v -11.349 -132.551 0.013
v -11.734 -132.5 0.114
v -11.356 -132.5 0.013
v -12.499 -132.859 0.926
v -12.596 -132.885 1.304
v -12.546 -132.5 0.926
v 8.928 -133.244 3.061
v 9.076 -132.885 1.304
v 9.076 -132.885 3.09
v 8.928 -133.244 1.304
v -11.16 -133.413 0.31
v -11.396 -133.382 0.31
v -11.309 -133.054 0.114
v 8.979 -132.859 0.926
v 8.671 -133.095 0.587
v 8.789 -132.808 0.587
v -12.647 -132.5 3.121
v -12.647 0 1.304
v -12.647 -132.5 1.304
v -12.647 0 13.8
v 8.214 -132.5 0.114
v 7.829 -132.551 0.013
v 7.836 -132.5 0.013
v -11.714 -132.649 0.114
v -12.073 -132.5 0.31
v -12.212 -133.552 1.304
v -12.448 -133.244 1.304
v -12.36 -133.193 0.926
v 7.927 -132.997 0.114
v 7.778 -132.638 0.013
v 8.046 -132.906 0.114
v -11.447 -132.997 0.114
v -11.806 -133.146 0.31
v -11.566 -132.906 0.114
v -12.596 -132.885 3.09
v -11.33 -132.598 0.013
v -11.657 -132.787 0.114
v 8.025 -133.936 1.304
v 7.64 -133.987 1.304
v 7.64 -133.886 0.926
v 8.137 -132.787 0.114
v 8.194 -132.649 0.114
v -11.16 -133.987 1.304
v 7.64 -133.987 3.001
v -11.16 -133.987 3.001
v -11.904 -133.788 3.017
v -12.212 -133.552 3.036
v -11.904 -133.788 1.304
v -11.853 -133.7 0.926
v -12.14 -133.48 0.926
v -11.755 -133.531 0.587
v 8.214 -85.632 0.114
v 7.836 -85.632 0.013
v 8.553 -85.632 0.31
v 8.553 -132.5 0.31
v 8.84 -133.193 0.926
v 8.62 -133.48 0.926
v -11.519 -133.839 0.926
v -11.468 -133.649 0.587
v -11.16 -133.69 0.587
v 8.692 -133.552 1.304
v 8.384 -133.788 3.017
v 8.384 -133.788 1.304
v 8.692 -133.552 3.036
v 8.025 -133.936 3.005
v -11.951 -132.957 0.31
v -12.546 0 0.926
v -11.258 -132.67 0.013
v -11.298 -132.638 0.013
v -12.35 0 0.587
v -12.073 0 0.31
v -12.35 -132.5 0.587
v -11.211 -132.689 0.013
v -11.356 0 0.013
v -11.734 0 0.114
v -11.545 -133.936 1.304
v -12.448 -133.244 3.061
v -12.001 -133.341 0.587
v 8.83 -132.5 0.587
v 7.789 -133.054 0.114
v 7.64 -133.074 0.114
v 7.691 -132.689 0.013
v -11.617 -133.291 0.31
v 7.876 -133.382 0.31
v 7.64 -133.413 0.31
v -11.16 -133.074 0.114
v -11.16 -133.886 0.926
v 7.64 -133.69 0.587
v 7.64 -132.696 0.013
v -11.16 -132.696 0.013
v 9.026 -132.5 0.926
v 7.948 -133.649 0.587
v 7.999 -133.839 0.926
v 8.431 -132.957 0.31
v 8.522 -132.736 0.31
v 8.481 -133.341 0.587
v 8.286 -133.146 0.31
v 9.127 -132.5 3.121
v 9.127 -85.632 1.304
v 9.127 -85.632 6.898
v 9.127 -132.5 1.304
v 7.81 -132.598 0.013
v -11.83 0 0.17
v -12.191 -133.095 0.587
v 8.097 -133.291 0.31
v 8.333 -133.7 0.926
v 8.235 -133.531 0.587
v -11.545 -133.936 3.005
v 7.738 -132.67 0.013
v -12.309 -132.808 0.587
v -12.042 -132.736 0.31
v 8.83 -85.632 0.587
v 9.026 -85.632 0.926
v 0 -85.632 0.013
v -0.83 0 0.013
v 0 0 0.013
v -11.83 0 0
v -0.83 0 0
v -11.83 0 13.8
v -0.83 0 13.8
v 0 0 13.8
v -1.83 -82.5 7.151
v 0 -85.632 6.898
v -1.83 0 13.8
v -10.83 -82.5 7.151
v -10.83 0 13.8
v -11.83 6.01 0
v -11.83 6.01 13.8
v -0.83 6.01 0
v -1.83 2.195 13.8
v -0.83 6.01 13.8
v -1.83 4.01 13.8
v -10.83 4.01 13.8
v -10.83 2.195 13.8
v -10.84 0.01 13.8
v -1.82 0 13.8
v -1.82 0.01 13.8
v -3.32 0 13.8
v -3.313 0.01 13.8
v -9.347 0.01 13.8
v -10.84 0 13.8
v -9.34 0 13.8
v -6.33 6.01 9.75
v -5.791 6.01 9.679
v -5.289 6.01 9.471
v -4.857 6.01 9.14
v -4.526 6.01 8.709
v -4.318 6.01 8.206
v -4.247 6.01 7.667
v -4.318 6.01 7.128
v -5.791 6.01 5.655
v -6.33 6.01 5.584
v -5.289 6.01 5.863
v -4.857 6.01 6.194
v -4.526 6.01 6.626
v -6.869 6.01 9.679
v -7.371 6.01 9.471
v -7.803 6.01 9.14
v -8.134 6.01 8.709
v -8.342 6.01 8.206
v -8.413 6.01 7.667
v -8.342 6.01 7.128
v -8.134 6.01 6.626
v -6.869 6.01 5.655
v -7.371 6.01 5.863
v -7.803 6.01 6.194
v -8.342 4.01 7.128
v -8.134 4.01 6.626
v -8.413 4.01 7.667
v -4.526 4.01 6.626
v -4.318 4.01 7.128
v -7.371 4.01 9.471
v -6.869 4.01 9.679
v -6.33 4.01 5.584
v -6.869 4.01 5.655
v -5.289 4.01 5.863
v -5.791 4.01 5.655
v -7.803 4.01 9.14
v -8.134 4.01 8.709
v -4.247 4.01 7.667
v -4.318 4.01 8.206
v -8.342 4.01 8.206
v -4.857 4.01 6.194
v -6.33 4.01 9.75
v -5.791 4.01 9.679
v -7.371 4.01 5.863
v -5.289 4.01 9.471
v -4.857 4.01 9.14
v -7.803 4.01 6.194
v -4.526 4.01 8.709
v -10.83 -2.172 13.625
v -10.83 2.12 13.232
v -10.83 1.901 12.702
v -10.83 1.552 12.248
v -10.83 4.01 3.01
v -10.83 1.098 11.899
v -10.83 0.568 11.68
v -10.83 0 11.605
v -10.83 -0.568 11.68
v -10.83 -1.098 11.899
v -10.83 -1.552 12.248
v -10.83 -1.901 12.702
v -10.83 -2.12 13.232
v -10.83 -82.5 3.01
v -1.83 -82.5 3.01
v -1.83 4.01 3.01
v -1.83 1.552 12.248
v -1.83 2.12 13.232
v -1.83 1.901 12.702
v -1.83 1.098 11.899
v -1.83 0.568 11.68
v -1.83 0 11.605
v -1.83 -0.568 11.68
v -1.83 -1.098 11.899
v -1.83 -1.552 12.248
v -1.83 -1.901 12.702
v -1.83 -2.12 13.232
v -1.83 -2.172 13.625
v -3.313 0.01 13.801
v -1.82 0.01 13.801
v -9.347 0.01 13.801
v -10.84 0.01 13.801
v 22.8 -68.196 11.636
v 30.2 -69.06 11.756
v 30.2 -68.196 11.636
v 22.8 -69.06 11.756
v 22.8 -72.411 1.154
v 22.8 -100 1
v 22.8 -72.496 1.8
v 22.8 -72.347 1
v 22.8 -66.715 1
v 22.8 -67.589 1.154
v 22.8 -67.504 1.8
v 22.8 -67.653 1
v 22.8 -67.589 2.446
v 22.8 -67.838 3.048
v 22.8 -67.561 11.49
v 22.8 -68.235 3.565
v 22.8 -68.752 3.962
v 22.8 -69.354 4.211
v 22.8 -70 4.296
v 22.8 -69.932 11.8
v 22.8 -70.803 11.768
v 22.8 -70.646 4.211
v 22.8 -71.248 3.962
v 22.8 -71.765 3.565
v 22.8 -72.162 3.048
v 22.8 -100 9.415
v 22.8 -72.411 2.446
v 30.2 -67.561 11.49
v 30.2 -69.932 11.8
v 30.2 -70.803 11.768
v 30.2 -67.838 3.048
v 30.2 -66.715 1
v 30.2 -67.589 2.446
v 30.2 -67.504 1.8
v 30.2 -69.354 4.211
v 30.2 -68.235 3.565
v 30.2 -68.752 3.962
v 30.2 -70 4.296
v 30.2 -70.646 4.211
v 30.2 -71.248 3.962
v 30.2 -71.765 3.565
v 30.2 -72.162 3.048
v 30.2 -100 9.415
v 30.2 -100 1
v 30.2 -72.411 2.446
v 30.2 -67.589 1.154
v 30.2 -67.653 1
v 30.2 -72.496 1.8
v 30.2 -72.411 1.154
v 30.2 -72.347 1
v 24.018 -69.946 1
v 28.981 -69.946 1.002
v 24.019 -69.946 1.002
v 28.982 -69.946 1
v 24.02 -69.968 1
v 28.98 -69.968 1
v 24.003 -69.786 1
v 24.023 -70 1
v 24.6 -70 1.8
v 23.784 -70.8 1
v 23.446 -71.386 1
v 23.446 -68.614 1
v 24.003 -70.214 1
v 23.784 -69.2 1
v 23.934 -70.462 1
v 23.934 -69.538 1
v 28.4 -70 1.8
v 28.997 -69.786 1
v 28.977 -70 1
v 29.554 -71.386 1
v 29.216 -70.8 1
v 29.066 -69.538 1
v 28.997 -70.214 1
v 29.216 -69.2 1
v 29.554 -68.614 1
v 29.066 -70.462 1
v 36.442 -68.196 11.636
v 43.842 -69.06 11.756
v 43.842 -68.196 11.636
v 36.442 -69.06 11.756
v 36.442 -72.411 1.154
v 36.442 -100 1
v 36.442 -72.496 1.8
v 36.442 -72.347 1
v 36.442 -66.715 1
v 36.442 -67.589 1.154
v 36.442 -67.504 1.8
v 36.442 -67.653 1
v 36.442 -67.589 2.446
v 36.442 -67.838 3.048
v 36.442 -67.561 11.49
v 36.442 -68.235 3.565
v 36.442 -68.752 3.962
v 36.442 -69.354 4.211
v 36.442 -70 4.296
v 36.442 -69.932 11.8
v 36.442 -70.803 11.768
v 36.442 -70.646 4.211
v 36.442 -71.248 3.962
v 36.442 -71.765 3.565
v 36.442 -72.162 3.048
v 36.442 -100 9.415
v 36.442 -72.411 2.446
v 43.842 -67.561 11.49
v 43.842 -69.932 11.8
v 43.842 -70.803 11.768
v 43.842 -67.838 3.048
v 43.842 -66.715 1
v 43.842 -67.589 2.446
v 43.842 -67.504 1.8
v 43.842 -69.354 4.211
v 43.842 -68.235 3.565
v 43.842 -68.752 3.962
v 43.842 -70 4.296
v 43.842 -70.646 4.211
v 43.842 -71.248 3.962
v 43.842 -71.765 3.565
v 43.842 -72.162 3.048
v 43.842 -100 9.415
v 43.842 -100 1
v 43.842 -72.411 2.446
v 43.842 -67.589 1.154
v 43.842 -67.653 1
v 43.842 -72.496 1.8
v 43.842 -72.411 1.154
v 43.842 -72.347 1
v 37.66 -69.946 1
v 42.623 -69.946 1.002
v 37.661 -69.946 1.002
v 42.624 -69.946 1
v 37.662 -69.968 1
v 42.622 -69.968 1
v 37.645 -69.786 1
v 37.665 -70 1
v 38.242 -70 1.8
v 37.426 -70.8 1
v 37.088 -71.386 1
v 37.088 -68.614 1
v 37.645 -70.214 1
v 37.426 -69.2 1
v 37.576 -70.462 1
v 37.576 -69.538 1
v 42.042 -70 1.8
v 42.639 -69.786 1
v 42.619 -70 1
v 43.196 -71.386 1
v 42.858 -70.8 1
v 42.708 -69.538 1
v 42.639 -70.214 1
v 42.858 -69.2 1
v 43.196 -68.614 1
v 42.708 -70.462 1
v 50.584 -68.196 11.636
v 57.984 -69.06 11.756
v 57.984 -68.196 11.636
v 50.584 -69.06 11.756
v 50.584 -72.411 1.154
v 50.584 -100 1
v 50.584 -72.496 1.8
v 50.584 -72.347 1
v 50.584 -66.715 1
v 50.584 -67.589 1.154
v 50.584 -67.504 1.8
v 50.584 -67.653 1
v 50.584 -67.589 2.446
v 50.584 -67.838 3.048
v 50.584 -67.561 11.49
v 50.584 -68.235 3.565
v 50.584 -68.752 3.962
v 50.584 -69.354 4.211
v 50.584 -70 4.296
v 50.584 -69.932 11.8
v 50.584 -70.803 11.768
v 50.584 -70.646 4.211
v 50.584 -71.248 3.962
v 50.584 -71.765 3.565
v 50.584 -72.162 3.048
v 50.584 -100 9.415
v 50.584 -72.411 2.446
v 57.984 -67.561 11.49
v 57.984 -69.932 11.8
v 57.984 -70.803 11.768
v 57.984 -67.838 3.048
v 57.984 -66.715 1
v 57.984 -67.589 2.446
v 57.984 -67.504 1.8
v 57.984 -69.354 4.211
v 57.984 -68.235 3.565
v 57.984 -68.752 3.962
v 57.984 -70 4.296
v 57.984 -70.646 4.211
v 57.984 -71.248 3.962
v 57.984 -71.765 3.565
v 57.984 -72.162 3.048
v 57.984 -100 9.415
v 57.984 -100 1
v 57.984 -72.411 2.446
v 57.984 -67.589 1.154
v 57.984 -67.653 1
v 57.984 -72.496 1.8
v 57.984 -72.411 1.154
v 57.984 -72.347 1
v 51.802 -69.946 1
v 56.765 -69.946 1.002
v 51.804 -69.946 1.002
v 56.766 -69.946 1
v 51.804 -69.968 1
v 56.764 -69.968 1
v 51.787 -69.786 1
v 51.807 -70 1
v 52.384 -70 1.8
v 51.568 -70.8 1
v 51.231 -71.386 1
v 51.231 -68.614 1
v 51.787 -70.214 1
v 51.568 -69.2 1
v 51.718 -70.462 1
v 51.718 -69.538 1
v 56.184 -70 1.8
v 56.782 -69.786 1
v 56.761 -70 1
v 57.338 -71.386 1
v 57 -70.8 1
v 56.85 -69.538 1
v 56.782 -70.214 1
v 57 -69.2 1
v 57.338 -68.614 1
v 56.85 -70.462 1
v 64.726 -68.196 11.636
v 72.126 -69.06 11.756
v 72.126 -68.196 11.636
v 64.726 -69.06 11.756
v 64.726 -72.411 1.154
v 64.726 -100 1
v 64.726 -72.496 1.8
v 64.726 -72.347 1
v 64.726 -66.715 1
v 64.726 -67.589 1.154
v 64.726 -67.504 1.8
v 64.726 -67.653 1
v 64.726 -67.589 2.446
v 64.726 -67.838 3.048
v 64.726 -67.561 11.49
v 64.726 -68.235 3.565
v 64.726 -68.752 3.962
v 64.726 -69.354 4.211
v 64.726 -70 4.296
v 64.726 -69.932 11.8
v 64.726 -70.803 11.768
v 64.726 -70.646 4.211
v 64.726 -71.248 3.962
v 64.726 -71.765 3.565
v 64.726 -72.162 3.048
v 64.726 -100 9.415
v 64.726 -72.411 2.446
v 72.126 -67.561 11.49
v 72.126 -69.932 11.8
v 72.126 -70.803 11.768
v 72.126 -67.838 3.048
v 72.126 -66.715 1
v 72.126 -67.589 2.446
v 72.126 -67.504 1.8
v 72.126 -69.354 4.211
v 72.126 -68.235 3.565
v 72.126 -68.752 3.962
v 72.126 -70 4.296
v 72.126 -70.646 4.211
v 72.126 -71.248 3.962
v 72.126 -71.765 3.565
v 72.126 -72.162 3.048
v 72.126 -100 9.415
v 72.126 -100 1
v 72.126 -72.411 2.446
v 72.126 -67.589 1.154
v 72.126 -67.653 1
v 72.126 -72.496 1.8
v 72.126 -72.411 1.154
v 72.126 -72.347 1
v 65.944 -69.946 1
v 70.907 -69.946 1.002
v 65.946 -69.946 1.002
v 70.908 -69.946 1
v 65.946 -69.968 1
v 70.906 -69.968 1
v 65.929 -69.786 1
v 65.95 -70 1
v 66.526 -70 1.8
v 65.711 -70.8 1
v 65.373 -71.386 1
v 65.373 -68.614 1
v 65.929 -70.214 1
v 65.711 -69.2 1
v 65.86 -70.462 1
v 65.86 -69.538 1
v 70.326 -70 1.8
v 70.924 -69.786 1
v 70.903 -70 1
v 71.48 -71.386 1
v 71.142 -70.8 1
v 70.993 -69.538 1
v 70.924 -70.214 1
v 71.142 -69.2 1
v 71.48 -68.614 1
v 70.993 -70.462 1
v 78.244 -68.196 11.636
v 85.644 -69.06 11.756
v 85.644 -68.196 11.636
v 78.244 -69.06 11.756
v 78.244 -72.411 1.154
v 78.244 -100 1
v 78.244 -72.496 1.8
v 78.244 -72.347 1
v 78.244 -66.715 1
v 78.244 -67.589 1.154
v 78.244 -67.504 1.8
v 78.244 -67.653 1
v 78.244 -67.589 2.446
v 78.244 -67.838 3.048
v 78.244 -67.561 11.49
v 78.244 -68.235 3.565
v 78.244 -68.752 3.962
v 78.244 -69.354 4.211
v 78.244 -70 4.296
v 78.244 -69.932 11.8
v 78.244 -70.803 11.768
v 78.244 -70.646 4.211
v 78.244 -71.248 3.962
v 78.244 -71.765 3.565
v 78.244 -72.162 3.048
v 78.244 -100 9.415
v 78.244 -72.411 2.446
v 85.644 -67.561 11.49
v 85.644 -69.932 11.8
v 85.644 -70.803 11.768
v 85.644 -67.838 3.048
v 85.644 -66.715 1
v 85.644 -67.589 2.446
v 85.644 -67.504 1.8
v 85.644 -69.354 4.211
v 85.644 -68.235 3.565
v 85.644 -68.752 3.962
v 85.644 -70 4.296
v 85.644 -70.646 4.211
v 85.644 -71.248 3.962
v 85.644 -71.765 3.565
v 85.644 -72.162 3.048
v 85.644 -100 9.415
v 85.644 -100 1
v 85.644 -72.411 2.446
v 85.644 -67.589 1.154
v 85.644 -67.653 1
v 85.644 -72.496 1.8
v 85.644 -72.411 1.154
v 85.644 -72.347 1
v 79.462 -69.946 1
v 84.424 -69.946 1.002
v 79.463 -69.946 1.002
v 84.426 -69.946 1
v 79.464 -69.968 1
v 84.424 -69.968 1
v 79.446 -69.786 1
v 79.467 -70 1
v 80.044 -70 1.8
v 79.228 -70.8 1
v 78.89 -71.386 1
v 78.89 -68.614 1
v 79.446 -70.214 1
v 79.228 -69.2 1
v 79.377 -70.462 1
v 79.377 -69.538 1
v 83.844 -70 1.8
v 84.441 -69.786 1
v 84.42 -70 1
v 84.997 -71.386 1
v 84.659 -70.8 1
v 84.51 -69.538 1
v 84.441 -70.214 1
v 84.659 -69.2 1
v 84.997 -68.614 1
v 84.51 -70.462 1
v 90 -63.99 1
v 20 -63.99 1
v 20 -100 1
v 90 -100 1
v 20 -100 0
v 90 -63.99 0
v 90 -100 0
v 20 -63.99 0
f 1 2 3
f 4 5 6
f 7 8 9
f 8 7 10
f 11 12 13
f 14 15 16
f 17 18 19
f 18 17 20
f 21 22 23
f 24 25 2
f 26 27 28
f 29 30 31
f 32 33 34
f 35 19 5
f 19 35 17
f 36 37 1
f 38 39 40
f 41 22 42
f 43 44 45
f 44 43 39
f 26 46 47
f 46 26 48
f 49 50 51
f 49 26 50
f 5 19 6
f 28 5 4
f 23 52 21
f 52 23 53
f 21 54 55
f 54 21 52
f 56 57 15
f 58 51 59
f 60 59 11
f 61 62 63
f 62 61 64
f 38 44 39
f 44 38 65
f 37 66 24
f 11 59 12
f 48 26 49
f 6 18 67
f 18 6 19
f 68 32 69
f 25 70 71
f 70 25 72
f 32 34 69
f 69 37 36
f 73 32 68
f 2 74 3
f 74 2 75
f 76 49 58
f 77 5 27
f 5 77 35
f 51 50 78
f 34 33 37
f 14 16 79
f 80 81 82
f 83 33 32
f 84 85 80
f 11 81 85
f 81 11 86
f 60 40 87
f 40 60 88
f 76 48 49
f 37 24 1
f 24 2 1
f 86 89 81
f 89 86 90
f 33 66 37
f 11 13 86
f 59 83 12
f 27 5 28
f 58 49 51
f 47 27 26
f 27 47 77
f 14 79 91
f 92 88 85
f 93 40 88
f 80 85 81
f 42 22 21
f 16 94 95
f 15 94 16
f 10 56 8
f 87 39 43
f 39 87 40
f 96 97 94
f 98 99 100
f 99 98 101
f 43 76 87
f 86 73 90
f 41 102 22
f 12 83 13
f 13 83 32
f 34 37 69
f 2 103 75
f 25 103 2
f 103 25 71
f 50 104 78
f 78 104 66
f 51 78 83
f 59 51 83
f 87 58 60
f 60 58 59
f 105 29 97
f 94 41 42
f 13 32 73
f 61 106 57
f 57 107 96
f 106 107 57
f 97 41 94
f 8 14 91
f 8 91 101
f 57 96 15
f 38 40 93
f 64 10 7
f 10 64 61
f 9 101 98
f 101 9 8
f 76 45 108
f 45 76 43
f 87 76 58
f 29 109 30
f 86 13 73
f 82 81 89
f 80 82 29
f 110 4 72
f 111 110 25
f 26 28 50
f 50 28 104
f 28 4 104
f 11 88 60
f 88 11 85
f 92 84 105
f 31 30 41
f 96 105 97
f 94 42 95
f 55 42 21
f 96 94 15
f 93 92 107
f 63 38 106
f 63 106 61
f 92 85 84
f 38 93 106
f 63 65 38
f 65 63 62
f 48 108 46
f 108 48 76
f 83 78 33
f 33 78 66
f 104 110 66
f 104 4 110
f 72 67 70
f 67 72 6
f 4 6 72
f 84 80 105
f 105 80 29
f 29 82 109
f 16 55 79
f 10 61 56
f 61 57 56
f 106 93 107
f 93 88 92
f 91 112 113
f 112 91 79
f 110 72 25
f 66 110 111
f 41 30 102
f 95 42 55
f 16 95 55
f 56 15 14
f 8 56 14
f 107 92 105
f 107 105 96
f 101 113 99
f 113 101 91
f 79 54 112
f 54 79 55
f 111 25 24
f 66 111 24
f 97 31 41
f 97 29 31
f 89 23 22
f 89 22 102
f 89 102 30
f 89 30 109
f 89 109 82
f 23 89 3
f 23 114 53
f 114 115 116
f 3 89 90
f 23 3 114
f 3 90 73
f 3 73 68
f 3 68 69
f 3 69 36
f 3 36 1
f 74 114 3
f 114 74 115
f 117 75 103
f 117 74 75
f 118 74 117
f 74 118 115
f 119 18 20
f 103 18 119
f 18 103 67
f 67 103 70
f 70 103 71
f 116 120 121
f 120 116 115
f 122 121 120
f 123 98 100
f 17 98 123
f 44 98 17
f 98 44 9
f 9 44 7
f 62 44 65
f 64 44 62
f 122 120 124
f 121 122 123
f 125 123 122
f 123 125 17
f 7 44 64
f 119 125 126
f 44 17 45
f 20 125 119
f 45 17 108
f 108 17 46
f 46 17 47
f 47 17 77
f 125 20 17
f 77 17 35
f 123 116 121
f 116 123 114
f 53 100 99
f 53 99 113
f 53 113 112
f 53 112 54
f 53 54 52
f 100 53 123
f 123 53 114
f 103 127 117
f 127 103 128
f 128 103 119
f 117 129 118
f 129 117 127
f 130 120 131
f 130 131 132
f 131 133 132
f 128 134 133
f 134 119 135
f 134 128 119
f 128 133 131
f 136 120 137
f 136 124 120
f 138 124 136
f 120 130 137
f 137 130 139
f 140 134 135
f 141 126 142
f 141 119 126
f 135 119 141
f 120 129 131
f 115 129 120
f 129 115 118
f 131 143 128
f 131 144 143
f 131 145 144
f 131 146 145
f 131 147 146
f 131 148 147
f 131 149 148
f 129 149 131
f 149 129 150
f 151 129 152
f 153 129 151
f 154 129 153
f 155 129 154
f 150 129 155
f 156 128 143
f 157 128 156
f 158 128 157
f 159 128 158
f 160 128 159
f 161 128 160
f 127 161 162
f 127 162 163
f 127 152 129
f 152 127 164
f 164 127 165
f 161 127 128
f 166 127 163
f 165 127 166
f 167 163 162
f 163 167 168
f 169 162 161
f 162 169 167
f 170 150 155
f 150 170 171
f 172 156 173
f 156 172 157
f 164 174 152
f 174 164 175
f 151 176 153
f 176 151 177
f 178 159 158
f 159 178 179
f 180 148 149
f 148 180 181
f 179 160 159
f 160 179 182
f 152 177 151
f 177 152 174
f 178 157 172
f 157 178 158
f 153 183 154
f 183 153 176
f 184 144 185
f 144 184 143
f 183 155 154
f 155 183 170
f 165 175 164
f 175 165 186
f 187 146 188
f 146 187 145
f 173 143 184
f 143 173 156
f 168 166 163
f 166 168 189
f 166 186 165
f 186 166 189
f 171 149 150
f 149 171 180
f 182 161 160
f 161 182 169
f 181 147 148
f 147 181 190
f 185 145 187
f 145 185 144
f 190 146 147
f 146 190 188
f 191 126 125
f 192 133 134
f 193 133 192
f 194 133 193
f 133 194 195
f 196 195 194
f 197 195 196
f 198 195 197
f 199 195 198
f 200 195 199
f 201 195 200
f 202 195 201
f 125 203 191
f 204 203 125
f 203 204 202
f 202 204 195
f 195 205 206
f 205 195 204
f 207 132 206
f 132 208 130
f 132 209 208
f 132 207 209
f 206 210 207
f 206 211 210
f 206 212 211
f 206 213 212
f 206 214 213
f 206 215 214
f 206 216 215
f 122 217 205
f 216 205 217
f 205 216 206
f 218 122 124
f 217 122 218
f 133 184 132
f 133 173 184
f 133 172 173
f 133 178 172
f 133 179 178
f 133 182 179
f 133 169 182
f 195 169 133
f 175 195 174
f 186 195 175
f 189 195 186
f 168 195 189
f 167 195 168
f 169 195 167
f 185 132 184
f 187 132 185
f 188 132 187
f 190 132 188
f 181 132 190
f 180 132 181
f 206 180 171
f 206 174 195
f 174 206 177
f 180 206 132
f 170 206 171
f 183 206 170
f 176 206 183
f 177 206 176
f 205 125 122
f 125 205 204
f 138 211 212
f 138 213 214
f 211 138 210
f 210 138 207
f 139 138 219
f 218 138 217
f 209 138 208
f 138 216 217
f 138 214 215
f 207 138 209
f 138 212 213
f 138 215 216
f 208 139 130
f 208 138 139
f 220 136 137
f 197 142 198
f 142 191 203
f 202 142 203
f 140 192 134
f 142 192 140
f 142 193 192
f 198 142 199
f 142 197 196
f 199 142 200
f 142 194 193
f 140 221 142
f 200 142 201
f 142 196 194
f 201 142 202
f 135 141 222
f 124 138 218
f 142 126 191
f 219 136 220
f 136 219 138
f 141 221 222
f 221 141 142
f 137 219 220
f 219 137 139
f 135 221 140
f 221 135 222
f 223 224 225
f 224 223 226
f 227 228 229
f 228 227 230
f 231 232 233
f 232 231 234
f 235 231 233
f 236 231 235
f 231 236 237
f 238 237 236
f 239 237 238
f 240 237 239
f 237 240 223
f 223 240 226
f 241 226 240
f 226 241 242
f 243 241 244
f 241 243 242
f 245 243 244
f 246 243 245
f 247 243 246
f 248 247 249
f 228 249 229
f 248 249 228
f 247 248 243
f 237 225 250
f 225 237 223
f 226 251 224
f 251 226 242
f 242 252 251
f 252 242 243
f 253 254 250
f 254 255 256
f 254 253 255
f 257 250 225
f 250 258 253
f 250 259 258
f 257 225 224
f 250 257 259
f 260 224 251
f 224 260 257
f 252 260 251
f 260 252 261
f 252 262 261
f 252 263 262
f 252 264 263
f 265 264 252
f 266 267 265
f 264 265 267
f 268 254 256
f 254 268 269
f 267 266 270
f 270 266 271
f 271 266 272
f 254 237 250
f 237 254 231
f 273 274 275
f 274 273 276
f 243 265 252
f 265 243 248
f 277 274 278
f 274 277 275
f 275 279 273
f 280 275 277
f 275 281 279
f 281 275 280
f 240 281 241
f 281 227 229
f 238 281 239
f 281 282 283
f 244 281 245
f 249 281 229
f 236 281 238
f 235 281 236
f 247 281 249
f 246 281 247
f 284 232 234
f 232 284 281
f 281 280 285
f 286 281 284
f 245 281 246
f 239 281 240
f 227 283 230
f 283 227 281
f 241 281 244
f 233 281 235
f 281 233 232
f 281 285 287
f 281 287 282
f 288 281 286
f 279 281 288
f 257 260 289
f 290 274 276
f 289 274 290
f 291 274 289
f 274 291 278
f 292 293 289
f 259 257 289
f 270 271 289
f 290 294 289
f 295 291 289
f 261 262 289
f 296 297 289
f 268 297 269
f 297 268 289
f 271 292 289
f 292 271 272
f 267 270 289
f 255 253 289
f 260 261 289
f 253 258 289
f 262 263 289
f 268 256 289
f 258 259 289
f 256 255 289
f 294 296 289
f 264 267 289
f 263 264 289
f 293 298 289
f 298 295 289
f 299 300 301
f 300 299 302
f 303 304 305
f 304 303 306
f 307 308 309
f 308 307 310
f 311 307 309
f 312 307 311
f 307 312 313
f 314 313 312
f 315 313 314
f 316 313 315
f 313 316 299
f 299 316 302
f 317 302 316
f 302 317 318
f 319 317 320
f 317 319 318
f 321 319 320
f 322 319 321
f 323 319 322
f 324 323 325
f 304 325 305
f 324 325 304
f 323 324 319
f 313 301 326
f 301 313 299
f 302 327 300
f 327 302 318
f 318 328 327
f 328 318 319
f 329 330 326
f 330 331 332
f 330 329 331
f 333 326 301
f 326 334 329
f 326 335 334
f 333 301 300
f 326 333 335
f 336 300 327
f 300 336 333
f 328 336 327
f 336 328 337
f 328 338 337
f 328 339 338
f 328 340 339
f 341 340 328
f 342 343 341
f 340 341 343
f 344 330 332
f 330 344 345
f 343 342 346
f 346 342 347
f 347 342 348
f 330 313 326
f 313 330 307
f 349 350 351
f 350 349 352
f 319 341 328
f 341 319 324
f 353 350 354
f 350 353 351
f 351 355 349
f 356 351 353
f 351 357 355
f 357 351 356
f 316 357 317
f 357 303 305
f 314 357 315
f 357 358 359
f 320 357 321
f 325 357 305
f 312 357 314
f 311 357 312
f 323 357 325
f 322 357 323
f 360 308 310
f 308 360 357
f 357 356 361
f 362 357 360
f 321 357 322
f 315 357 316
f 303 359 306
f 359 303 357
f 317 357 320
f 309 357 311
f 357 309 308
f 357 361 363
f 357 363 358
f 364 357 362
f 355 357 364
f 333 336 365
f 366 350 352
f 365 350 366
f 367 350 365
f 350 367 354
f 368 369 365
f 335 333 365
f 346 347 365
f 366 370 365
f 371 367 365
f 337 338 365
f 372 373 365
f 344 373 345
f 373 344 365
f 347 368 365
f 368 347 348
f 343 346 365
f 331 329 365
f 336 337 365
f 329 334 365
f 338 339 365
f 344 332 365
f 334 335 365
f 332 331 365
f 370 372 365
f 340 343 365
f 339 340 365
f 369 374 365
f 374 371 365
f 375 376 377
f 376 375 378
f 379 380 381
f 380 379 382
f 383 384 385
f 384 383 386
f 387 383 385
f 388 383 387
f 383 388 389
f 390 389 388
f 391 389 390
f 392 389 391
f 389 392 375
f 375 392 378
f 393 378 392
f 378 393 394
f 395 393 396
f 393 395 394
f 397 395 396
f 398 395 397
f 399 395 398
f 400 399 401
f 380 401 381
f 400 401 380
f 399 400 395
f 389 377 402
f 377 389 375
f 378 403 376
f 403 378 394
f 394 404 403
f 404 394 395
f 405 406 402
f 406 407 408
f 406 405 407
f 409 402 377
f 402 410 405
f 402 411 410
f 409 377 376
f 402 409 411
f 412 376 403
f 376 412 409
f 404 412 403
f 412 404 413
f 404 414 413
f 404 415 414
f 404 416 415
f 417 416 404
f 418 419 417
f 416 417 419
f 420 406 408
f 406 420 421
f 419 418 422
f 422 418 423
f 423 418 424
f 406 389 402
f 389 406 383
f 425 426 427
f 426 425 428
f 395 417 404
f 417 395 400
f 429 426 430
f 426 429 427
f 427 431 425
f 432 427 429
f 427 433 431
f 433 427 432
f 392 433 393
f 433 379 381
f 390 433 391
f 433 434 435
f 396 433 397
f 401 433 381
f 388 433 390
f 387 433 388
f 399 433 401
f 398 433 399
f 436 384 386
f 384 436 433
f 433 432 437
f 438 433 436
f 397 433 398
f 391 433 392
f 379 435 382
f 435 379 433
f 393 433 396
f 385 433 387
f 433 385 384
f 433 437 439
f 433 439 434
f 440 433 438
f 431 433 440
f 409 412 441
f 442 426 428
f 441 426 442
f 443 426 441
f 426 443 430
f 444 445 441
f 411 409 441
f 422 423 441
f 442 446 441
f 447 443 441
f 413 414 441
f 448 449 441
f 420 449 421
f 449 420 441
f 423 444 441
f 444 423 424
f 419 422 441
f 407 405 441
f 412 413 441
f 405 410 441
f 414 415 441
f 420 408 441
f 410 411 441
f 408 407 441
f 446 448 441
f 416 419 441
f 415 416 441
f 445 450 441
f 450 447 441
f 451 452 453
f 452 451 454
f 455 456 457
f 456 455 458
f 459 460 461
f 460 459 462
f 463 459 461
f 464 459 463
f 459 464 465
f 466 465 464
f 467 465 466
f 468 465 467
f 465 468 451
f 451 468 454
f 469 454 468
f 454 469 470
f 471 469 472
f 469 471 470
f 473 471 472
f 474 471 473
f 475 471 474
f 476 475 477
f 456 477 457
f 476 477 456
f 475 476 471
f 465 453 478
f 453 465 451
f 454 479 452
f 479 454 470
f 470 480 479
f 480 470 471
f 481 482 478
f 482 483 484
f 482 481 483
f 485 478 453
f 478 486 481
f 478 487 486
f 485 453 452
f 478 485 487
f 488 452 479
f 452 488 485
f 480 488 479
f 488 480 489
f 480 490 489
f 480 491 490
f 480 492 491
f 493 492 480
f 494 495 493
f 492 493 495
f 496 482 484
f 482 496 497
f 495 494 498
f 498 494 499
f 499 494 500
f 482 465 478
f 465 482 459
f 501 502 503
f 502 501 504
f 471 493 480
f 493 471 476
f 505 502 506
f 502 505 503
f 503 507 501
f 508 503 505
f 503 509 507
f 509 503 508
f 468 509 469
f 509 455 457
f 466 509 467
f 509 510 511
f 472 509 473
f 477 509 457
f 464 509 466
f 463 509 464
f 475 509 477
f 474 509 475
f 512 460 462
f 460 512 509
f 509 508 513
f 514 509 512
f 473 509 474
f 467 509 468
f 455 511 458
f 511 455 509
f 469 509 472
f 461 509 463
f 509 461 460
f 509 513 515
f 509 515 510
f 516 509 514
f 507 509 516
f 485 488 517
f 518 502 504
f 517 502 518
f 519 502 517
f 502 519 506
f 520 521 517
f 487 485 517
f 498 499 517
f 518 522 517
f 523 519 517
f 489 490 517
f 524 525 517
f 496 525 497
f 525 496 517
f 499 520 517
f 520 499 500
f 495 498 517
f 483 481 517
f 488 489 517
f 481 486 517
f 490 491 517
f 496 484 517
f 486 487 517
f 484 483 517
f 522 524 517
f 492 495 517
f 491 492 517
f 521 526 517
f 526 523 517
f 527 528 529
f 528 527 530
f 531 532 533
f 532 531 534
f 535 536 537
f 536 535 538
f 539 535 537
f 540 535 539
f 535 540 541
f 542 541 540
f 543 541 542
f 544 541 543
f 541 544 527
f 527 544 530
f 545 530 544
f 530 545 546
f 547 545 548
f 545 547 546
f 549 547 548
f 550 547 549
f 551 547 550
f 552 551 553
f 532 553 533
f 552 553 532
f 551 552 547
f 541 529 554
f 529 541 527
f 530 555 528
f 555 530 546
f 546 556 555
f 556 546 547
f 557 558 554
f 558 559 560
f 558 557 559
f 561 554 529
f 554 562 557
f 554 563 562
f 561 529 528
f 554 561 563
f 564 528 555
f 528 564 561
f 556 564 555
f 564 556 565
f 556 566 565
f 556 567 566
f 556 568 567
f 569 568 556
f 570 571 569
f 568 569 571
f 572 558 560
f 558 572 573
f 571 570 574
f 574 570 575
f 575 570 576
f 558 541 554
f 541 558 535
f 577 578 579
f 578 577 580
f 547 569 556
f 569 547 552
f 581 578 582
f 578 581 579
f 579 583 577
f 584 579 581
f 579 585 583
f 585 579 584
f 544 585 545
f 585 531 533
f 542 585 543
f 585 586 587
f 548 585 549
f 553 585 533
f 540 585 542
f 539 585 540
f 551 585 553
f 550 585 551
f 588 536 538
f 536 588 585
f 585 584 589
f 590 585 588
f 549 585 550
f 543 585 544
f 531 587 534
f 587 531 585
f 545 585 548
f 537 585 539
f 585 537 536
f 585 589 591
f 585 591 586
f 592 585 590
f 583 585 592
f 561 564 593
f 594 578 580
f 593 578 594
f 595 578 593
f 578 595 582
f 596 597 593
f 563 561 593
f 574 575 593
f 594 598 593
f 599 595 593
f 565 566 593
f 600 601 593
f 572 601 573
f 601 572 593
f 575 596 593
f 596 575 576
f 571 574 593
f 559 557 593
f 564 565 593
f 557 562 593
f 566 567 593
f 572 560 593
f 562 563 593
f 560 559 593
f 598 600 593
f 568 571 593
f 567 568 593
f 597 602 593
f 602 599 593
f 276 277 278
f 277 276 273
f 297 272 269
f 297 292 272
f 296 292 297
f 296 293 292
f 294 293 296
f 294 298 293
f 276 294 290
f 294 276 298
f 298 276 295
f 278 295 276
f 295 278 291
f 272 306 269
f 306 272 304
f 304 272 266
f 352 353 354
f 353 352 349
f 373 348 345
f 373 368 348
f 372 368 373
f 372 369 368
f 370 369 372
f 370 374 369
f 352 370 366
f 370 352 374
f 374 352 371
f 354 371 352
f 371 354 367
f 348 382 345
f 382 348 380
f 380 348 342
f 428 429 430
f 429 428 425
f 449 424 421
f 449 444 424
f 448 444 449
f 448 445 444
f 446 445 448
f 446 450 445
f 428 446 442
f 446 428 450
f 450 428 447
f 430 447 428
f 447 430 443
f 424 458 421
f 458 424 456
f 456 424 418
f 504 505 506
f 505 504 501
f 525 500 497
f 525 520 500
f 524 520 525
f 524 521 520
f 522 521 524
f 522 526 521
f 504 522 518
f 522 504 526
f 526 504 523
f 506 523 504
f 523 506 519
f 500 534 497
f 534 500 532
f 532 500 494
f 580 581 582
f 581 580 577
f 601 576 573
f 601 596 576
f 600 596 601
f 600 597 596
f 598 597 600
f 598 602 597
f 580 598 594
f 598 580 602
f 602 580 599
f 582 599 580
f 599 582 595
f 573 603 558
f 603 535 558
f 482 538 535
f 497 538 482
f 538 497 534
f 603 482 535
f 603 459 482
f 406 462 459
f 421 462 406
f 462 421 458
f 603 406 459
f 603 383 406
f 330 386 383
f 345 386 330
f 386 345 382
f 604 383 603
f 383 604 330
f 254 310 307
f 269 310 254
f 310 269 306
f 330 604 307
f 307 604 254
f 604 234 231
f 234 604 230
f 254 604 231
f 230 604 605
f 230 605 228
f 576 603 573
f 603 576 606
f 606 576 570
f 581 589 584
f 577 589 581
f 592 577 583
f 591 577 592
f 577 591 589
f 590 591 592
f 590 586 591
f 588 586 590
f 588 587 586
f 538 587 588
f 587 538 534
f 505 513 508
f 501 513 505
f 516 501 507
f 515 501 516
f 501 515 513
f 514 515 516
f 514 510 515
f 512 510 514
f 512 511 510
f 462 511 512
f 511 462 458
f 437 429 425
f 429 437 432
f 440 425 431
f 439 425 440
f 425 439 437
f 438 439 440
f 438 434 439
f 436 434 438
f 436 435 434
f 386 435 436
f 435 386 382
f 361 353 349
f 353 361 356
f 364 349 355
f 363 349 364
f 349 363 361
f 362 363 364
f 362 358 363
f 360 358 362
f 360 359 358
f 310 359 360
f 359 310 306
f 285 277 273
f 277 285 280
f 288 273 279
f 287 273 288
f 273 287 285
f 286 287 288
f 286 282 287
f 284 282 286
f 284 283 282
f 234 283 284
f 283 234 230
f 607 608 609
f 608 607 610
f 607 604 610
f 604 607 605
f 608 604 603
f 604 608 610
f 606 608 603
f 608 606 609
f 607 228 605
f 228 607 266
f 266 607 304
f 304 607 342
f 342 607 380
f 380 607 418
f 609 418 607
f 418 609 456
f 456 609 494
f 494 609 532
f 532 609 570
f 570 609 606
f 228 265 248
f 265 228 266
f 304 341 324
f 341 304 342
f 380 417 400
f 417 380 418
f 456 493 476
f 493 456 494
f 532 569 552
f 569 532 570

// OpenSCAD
/* piano-keyboard.scad - piano keyboard with dimensions copied from my midi keyboard
 * William de Beaumont
 * 2017-02-19
 */

// measurements taken from my optimus md-1150
octave = 162.5;
white_width = 21.8;
white_gap = octave / 7 - white_width; // suspiciously close to sqrt(2)
black_width = 11; // but slightly narrower at the top
black_top_width = 9.8; // ?
white_depth = 134;
black_min_depth = 77; // at top
black_max_depth = 84; // at bottom, next to top of white key
white_travel = 16.9 - 6.1; // at max end of white key
// measured
//black_travel = 12 - 5.6; // ? at max end of black key (but tilted)
// calculated with the assumption that the travel angle is the same for b&w
black_travel = white_travel * black_max_depth / white_depth;
// height of black key above white key, with neither depressed
black_min_height = 8; // at min end of key, toward fulcrum
black_max_height = 12; // at max end of key
corner_radius = 1.5; // ? approx (maybe less for top of black keys)
// ^^^ doesn't apply to cutouts in white keys for black keys

// measurements from paper transfer
c_stem_width = 13;
d_stem_width = 14;
e_stem_width = 12.75;
f_stem_width = 12.1;
g_stem_width = 12.15;
a_stem_width = 12.15;
b_stem_width = 12.1;

black_gap =
  (octave - 
    ( // add up everything but the black gaps
      c_stem_width +
      d_stem_width +
      e_stem_width +
      f_stem_width +
      g_stem_width +
      a_stem_width +
      b_stem_width +
      5*black_width +
      2*white_gap
    )
  ) / 10;

c_x = 0;
c_sharp_x = c_x + c_stem_width + black_gap;
d_x = c_sharp_x + black_width + black_gap;
d_sharp_x = d_x + d_stem_width + black_gap;
e_x = d_sharp_x + black_width + black_gap;
f_x = e_x + e_stem_width + white_gap;
f_sharp_x = f_x + f_stem_width + black_gap;
g_x = f_sharp_x + black_width + black_gap;
g_sharp_x = g_x + g_stem_width + black_gap;
a_x = g_sharp_x + black_width + black_gap;
a_sharp_x = a_x + a_stem_width + black_gap;
b_x = a_sharp_x + black_width + black_gap;

screw_radius = 4.1656 / 2; // UTS #8

// end measurements

wall_thickness = 1;
white_thickness = 2*corner_radius;
gap = 0.3;
thin_wall_deduction = 0.2;/* for imperfect printing */
sliding_deduction = 0.3;
support_gap = gap + thin_wall_deduction + sliding_deduction; // TODO more gap for easy sliding?
epsilon = 0.01;

pad_thickness = 25.4 / 4; // 1/4"
screw_axis_height = pad_thickness + screw_radius - (wall_thickness + support_gap) - 0.5/*for imperfect printing*/;
screw_hole_depth = 2*wall_thickness;

key_back_width = black_width;
key_back_depth = 6+epsilon;
white_back_height = white_travel + white_thickness;
black_back_height = white_back_height + black_min_height;

hollow_width = key_back_width - 2*wall_thickness;
hollow_height = white_travel;
support_width = hollow_width - 2*support_gap;
support_depth = 40;

hinge_radius = key_back_depth - (screw_hole_depth+wall_thickness+support_gap);
hinge_height = wall_thickness + 0.5/*for imperfect printing*/;

$fn=24;

module white_key(left_cutout, right_cutout) {
    translate([-left_cutout,0,0])
  union() {
    difference() {
      union() {
	// front
	difference() {
	  intersection() {
	    minkowski() {
		translate([corner_radius,-(white_depth-corner_radius),0])
	      cube([white_width-2*corner_radius, white_depth-corner_radius, white_travel + white_thickness -corner_radius]);
	      sphere(r=corner_radius);
	    }
	      translate([-epsilon,-(white_depth+epsilon),0])
	    cube([white_width+2*epsilon, white_depth+epsilon, white_travel + white_thickness +epsilon]);
	    // the "10" in the following I think should be:
	    // white_thickness*white_travel/sqrt(white_depth*white_depth+white_travel*white_travel)
	    // but obviously I made a mistake because that still cuts into the front
	      rotate([-atan2(white_travel, white_depth),0,0])
	      translate([0,-white_depth-10,0])
	    cube([white_width+2*epsilon, white_depth + 10, white_travel + white_thickness]);
	  }
	  if (left_cutout > 0) {
	      translate([-epsilon, epsilon-(black_max_depth + black_gap), -epsilon])
	    cube([left_cutout + epsilon, black_max_depth + black_gap, white_travel + white_thickness + 2*epsilon]);
	  }
	  if (right_cutout > 0) {
	      translate([white_width - right_cutout, epsilon-(black_max_depth + black_gap), -epsilon])
	    cube([right_cutout + epsilon, black_max_depth + black_gap, white_travel + white_thickness + 2*epsilon]);
	  }
	}
	// back
	  translate([left_cutout + (white_width - left_cutout - right_cutout - key_back_width) / 2, 0, 0])
	difference() {
	  cube([key_back_width, key_back_depth, white_back_height]);
	    translate([key_back_width/2, key_back_depth+epsilon, screw_axis_height])
	    rotate([90,0,0])
	  cylinder(r=screw_radius, h=screw_hole_depth+2*epsilon);
	}
      }
      // hollow
	translate([left_cutout + (white_width - left_cutout - right_cutout - hollow_width)/2,-(black_max_depth-corner_radius),-epsilon])
      cube([hollow_width, black_max_depth+key_back_depth-(corner_radius + screw_hole_depth), hollow_height]);
    }
    // hinge
      translate([left_cutout + (white_width - left_cutout - right_cutout - hollow_width)/2,0,0])
    intersection() {
      union() {
	  translate([-epsilon,0,0])
	  rotate([0,90,0])
	cylinder(r1=hinge_radius, r2=0, h=hinge_height);
	  translate([hollow_width+epsilon,0,0])
	  rotate([0,-90,0])
	cylinder(r1=hinge_radius, r2=0, h=hinge_height);
      }
      union() {
	  translate([-2*epsilon,0,0])
	cube([hollow_width+4*epsilon, hinge_radius+epsilon, hinge_radius+epsilon]);
	  rotate([-atan2(white_travel, white_depth),0,0])
	  translate([-2*epsilon,-hinge_radius,0])
	cube([hollow_width+4*epsilon, hinge_radius+epsilon, hinge_radius+epsilon]);
      }
    }
  }
}

module black_key() {
  /* no-radius version
    translate([0,0,white_travel + white_thickness])
  polyhedron(
    points=[
      // at top of white keys
      [		 0,			0, 0],
      [black_width,			0, 0],
      [		 0,	-black_max_depth,  0],
      [black_width,	-black_max_depth,  0],
      // at top of black key
      [(black_width - black_top_width)/2,
       0,
       black_min_height],
      [black_width - (black_width - black_top_width)/2,
       0,
       black_min_height],
      [(black_width - black_top_width)/2,
       -black_min_depth,
       black_max_height],
      [black_width - (black_width - black_top_width)/2,
       -black_min_depth,
       black_max_height]
    ],
    faces=[
      [0,2,3,1], // bottom
      [4,5,7,6], // top
      [0,4,6,2], // left
      [1,3,7,5], // right
      [0,1,5,4], // back
      [2,6,7,3], // front
    ],
    convexity=2
  );*/
  // radius version
  difference() {
    union() {
      // bottom (under top of white keys)
	translate([0, -(black_max_depth-corner_radius), 0])
      cube([black_width, black_max_depth-corner_radius, white_travel + white_thickness]);
	translate([corner_radius, -black_max_depth, 0])
      cube([black_width - 2*corner_radius, corner_radius, white_travel + white_thickness]);
	translate([corner_radius, -(black_max_depth-corner_radius), 0])
      cylinder(r=corner_radius, h=white_travel + white_thickness);
	translate([black_width - corner_radius, -(black_max_depth-corner_radius), 0])
      cylinder(r=corner_radius, h=white_travel + white_thickness);
      // back
      cube([key_back_width, key_back_depth, black_back_height]);
      // top (over top of white keys)
      minkowski() {
	  translate([0,0,white_travel + white_thickness])
	polyhedron(
	  points=[
	    // at top of white keys
	    [corner_radius,				0,		0],
	    [black_width-corner_radius,			0,		0],
	    [corner_radius,	-black_max_depth+corner_radius,		0],
	    [black_width-corner_radius,-black_max_depth+corner_radius,	0],
	    // at top of black key
	    [(black_width - black_top_width)/2+corner_radius,
	     0,
	     black_min_height-corner_radius],
	    [black_width - (black_width - black_top_width)/2 - corner_radius,
	     0,
	     black_min_height-corner_radius],
	    [(black_width - black_top_width)/2+corner_radius,
	     -black_min_depth+corner_radius,
	     black_max_height-corner_radius],
	    [black_width - (black_width - black_top_width)/2 - corner_radius,
	     -black_min_depth+corner_radius,
	     black_max_height-corner_radius]
	  ],
	  faces=[
	    [0,2,3,1], // bottom
	    [4,5,7,6], // top
	    [0,4,6,2], // left
	    [1,3,7,5], // right
	    [0,1,5,4], // back
	    [2,6,7,3], // front
	  ],
	  convexity=2
	);
	sphere(r=corner_radius);
      }
    }
    // bottom angle
      rotate([-atan2(black_travel, black_max_depth),0,0])
      translate([-epsilon,-black_max_depth-10, -white_travel])
    cube([black_width+2*epsilon, black_max_depth + 10, white_travel]);
    // top angle
      translate([0,0, white_travel + white_thickness + black_min_height + epsilon])
      rotate([-(atan2(black_max_height-black_min_height, black_min_depth) /* fudge factor? */+5*epsilon),0,0])
      translate([-epsilon,-black_max_depth, 0])
    cube([black_width+2*epsilon, key_back_depth + black_max_depth + 10, white_travel]);
    // back hole
      translate([key_back_width/2, key_back_depth+epsilon, screw_axis_height])
      rotate([90,0,0])
    cylinder(r=screw_radius, h=screw_hole_depth+2*epsilon);
    // hollow
      translate([(black_width - hollow_width)/2,-(black_max_depth-corner_radius),-epsilon])
    cube([hollow_width, black_max_depth+key_back_depth-(corner_radius + screw_hole_depth), hollow_height]);
  }
  // hinge
  intersection() {
    union() {
	translate([(black_width - hollow_width)/2-epsilon,0,0])
	rotate([0,90,0])
      cylinder(r1=hinge_radius, r2=0, h=hinge_height);
	translate([black_width-((black_width - hollow_width)/2-epsilon),0,0])
	rotate([0,-90,0])
      cylinder(r1=hinge_radius, r2=0, h=hinge_height);
    }
    union() {
	translate([-(hinge_height+epsilon),0,0])
      cube([black_width+2*hinge_height+2*epsilon, hinge_radius+epsilon, hinge_radius+epsilon]);
	rotate([-atan2(black_travel, black_max_depth),0,0])
	translate([-(hinge_height+epsilon),-hinge_radius,0])
      cube([black_width+2*hinge_height+2*epsilon, hinge_radius+epsilon, hinge_radius+epsilon]);
    }
  }
}

module octave_white_keys() {
  translate([c_x,0,0]) white_key(0, white_width - c_stem_width);
    translate([d_x,0,0])
  white_key(
    d_x - (white_width + white_gap),
    2*white_width + white_gap - (d_sharp_x - black_gap)
  );
    translate([e_x,0,0])
  white_key(
    e_x - 2*(white_width + white_gap),
    0
  );
    translate([f_x,0,0])
  white_key(
    0,
    4*white_width + 3*white_gap - (f_sharp_x - black_gap)
  );
    translate([g_x,0,0])
  white_key(
    g_x - 4*(white_width + white_gap),
    5*white_width + 4*white_gap - (g_sharp_x - black_gap)
  );
    translate([a_x,0,0])
  white_key(
    a_x - 5*(white_width + white_gap),
    6*white_width + 5*white_gap - (a_sharp_x - black_gap)
  );
    translate([b_x,0,0])
  white_key(
    b_x - 6*(white_width + white_gap),
    0
  );
}

module octave_black_keys() {
  translate([c_sharp_x,0,0]) black_key();
  translate([d_sharp_x,0,0]) black_key();
  translate([f_sharp_x,0,0]) black_key();
  translate([g_sharp_x,0,0]) black_key();
  translate([a_sharp_x,0,0]) black_key();
}

module octave() {
  octave_white_keys();
  octave_black_keys();
}

support_back_depth = key_back_depth-(screw_hole_depth+support_gap)+epsilon;

module support_wall(x, next_x, next_gap) {
    translate([(x + next_x - next_gap - support_width)/2,0,0])
  difference() {
      rotate([atan2(white_travel, white_depth),0,0])
    union() {
      // curved top corner
      intersection() {
	  rotate([0,90,0])
	cylinder(r=hollow_height-support_gap, h=support_width+2*epsilon, $fn=72);
	  translate([0, -epsilon, -(support_gap + support_back_depth * white_travel / white_depth + epsilon)])
	cube([support_width, support_back_depth, hollow_height + support_back_depth * white_travel / white_depth + epsilon]);
      }
      // bulk
        translate([0, -support_depth, -support_gap])
      cube([support_width, support_depth, hollow_height]);
    }
    // bottom
      translate([-epsilon, -(support_depth - (support_back_depth + epsilon)), -(hollow_height + support_gap + epsilon)])
    cube([support_width+2*epsilon, support_depth+2*epsilon, hollow_height]);
    // front
      translate([-epsilon, -(hollow_height + support_depth - key_back_depth), -hollow_height])
    cube([support_width+2*epsilon, hollow_height, 2*hollow_height]);
    // hinge pits
      translate([-epsilon,0,0])
      rotate([0,90,0])
    cylinder(r1=hinge_radius + gap, r2=0, h=hinge_height + gap+epsilon);
      translate([support_width+epsilon,0,0])
      rotate([0,-90,0])
    cylinder(r1=hinge_radius + gap, r2=0, h=hinge_height + gap+epsilon);
  }
}

// key support with holes for hinges
module support() {
  // bottom
    translate([0, -(support_depth - key_back_depth), -(wall_thickness + support_gap)])
  cube([octave, support_depth, wall_thickness]);
  // walls inside keys
  support_wall(c_x, c_sharp_x, black_gap);
  support_wall(c_sharp_x, d_x, black_gap);
  support_wall(d_x, d_sharp_x, black_gap);
  support_wall(d_sharp_x, e_x, black_gap);
  support_wall(e_x, f_x, white_gap);
  support_wall(f_x, f_sharp_x, black_gap);
  support_wall(f_sharp_x, g_x, black_gap);
  support_wall(g_x, g_sharp_x, black_gap);
  support_wall(g_sharp_x, a_x, black_gap);
  support_wall(a_x, a_sharp_x, black_gap);
  support_wall(a_sharp_x, b_x, black_gap);
  support_wall(b_x, octave, white_gap);
}

module assembled() {
  octave();
  support();
}

module plated_white_keys() {
    translate([0,0,white_travel + white_thickness])
    rotate([0,180,0])
  octave_white_keys();
}

module plated_black_keys() {
    translate([0,0,black_min_height + white_travel + white_thickness])
    rotate([0,180,0])
    rotate([(atan2(black_max_height-black_min_height, black_min_depth) /* fudge factor? */+5*epsilon),0,0])
  octave_black_keys();
}

module plated_keys() {
  plated_white_keys();
  plated_black_keys();
}

//assembled();
// difference() { // cutaway
//   assembled();
//     translate([0,-40,1])
//   cube([7,50,30]);
// }
//octave();
//plated_keys();
//support();

//
// fit test
//

//  rotate([0,0,40])
union() {
  // // plated C key
  //   translate([0,0,white_travel + white_thickness])
  //   rotate([0,180,0])
  // white_key(0, white_width - c_stem_width);
  // // plated C# key
  //   translate([0,0,black_min_height + white_travel + white_thickness])
  //   rotate([0,180,0])
  //   rotate([(atan2(black_max_height-black_min_height, black_min_depth) /* fudge factor? */+5*epsilon),0,0])
  // black_key();
  // // plated D key
  //   translate([0,0,white_travel + white_thickness])
  //   rotate([0,180,0])
  // white_key(
  //   d_x - (white_width + white_gap),
  //   2*white_width + white_gap - (d_sharp_x - black_gap)
  // );
  // plated E key
    translate([0,0,white_travel + white_thickness])
    rotate([0,180,0])
  white_key(
    e_x - 2*(white_width + white_gap),
    0
  );
  // plated support for C-E keys only
    translate([10,-20,0])
  intersection() {
      translate([5,-80,-epsilon])
    cube([75,60,30]);
      translate([10, -50, wall_thickness + support_gap])
    support(true);
  }
}
